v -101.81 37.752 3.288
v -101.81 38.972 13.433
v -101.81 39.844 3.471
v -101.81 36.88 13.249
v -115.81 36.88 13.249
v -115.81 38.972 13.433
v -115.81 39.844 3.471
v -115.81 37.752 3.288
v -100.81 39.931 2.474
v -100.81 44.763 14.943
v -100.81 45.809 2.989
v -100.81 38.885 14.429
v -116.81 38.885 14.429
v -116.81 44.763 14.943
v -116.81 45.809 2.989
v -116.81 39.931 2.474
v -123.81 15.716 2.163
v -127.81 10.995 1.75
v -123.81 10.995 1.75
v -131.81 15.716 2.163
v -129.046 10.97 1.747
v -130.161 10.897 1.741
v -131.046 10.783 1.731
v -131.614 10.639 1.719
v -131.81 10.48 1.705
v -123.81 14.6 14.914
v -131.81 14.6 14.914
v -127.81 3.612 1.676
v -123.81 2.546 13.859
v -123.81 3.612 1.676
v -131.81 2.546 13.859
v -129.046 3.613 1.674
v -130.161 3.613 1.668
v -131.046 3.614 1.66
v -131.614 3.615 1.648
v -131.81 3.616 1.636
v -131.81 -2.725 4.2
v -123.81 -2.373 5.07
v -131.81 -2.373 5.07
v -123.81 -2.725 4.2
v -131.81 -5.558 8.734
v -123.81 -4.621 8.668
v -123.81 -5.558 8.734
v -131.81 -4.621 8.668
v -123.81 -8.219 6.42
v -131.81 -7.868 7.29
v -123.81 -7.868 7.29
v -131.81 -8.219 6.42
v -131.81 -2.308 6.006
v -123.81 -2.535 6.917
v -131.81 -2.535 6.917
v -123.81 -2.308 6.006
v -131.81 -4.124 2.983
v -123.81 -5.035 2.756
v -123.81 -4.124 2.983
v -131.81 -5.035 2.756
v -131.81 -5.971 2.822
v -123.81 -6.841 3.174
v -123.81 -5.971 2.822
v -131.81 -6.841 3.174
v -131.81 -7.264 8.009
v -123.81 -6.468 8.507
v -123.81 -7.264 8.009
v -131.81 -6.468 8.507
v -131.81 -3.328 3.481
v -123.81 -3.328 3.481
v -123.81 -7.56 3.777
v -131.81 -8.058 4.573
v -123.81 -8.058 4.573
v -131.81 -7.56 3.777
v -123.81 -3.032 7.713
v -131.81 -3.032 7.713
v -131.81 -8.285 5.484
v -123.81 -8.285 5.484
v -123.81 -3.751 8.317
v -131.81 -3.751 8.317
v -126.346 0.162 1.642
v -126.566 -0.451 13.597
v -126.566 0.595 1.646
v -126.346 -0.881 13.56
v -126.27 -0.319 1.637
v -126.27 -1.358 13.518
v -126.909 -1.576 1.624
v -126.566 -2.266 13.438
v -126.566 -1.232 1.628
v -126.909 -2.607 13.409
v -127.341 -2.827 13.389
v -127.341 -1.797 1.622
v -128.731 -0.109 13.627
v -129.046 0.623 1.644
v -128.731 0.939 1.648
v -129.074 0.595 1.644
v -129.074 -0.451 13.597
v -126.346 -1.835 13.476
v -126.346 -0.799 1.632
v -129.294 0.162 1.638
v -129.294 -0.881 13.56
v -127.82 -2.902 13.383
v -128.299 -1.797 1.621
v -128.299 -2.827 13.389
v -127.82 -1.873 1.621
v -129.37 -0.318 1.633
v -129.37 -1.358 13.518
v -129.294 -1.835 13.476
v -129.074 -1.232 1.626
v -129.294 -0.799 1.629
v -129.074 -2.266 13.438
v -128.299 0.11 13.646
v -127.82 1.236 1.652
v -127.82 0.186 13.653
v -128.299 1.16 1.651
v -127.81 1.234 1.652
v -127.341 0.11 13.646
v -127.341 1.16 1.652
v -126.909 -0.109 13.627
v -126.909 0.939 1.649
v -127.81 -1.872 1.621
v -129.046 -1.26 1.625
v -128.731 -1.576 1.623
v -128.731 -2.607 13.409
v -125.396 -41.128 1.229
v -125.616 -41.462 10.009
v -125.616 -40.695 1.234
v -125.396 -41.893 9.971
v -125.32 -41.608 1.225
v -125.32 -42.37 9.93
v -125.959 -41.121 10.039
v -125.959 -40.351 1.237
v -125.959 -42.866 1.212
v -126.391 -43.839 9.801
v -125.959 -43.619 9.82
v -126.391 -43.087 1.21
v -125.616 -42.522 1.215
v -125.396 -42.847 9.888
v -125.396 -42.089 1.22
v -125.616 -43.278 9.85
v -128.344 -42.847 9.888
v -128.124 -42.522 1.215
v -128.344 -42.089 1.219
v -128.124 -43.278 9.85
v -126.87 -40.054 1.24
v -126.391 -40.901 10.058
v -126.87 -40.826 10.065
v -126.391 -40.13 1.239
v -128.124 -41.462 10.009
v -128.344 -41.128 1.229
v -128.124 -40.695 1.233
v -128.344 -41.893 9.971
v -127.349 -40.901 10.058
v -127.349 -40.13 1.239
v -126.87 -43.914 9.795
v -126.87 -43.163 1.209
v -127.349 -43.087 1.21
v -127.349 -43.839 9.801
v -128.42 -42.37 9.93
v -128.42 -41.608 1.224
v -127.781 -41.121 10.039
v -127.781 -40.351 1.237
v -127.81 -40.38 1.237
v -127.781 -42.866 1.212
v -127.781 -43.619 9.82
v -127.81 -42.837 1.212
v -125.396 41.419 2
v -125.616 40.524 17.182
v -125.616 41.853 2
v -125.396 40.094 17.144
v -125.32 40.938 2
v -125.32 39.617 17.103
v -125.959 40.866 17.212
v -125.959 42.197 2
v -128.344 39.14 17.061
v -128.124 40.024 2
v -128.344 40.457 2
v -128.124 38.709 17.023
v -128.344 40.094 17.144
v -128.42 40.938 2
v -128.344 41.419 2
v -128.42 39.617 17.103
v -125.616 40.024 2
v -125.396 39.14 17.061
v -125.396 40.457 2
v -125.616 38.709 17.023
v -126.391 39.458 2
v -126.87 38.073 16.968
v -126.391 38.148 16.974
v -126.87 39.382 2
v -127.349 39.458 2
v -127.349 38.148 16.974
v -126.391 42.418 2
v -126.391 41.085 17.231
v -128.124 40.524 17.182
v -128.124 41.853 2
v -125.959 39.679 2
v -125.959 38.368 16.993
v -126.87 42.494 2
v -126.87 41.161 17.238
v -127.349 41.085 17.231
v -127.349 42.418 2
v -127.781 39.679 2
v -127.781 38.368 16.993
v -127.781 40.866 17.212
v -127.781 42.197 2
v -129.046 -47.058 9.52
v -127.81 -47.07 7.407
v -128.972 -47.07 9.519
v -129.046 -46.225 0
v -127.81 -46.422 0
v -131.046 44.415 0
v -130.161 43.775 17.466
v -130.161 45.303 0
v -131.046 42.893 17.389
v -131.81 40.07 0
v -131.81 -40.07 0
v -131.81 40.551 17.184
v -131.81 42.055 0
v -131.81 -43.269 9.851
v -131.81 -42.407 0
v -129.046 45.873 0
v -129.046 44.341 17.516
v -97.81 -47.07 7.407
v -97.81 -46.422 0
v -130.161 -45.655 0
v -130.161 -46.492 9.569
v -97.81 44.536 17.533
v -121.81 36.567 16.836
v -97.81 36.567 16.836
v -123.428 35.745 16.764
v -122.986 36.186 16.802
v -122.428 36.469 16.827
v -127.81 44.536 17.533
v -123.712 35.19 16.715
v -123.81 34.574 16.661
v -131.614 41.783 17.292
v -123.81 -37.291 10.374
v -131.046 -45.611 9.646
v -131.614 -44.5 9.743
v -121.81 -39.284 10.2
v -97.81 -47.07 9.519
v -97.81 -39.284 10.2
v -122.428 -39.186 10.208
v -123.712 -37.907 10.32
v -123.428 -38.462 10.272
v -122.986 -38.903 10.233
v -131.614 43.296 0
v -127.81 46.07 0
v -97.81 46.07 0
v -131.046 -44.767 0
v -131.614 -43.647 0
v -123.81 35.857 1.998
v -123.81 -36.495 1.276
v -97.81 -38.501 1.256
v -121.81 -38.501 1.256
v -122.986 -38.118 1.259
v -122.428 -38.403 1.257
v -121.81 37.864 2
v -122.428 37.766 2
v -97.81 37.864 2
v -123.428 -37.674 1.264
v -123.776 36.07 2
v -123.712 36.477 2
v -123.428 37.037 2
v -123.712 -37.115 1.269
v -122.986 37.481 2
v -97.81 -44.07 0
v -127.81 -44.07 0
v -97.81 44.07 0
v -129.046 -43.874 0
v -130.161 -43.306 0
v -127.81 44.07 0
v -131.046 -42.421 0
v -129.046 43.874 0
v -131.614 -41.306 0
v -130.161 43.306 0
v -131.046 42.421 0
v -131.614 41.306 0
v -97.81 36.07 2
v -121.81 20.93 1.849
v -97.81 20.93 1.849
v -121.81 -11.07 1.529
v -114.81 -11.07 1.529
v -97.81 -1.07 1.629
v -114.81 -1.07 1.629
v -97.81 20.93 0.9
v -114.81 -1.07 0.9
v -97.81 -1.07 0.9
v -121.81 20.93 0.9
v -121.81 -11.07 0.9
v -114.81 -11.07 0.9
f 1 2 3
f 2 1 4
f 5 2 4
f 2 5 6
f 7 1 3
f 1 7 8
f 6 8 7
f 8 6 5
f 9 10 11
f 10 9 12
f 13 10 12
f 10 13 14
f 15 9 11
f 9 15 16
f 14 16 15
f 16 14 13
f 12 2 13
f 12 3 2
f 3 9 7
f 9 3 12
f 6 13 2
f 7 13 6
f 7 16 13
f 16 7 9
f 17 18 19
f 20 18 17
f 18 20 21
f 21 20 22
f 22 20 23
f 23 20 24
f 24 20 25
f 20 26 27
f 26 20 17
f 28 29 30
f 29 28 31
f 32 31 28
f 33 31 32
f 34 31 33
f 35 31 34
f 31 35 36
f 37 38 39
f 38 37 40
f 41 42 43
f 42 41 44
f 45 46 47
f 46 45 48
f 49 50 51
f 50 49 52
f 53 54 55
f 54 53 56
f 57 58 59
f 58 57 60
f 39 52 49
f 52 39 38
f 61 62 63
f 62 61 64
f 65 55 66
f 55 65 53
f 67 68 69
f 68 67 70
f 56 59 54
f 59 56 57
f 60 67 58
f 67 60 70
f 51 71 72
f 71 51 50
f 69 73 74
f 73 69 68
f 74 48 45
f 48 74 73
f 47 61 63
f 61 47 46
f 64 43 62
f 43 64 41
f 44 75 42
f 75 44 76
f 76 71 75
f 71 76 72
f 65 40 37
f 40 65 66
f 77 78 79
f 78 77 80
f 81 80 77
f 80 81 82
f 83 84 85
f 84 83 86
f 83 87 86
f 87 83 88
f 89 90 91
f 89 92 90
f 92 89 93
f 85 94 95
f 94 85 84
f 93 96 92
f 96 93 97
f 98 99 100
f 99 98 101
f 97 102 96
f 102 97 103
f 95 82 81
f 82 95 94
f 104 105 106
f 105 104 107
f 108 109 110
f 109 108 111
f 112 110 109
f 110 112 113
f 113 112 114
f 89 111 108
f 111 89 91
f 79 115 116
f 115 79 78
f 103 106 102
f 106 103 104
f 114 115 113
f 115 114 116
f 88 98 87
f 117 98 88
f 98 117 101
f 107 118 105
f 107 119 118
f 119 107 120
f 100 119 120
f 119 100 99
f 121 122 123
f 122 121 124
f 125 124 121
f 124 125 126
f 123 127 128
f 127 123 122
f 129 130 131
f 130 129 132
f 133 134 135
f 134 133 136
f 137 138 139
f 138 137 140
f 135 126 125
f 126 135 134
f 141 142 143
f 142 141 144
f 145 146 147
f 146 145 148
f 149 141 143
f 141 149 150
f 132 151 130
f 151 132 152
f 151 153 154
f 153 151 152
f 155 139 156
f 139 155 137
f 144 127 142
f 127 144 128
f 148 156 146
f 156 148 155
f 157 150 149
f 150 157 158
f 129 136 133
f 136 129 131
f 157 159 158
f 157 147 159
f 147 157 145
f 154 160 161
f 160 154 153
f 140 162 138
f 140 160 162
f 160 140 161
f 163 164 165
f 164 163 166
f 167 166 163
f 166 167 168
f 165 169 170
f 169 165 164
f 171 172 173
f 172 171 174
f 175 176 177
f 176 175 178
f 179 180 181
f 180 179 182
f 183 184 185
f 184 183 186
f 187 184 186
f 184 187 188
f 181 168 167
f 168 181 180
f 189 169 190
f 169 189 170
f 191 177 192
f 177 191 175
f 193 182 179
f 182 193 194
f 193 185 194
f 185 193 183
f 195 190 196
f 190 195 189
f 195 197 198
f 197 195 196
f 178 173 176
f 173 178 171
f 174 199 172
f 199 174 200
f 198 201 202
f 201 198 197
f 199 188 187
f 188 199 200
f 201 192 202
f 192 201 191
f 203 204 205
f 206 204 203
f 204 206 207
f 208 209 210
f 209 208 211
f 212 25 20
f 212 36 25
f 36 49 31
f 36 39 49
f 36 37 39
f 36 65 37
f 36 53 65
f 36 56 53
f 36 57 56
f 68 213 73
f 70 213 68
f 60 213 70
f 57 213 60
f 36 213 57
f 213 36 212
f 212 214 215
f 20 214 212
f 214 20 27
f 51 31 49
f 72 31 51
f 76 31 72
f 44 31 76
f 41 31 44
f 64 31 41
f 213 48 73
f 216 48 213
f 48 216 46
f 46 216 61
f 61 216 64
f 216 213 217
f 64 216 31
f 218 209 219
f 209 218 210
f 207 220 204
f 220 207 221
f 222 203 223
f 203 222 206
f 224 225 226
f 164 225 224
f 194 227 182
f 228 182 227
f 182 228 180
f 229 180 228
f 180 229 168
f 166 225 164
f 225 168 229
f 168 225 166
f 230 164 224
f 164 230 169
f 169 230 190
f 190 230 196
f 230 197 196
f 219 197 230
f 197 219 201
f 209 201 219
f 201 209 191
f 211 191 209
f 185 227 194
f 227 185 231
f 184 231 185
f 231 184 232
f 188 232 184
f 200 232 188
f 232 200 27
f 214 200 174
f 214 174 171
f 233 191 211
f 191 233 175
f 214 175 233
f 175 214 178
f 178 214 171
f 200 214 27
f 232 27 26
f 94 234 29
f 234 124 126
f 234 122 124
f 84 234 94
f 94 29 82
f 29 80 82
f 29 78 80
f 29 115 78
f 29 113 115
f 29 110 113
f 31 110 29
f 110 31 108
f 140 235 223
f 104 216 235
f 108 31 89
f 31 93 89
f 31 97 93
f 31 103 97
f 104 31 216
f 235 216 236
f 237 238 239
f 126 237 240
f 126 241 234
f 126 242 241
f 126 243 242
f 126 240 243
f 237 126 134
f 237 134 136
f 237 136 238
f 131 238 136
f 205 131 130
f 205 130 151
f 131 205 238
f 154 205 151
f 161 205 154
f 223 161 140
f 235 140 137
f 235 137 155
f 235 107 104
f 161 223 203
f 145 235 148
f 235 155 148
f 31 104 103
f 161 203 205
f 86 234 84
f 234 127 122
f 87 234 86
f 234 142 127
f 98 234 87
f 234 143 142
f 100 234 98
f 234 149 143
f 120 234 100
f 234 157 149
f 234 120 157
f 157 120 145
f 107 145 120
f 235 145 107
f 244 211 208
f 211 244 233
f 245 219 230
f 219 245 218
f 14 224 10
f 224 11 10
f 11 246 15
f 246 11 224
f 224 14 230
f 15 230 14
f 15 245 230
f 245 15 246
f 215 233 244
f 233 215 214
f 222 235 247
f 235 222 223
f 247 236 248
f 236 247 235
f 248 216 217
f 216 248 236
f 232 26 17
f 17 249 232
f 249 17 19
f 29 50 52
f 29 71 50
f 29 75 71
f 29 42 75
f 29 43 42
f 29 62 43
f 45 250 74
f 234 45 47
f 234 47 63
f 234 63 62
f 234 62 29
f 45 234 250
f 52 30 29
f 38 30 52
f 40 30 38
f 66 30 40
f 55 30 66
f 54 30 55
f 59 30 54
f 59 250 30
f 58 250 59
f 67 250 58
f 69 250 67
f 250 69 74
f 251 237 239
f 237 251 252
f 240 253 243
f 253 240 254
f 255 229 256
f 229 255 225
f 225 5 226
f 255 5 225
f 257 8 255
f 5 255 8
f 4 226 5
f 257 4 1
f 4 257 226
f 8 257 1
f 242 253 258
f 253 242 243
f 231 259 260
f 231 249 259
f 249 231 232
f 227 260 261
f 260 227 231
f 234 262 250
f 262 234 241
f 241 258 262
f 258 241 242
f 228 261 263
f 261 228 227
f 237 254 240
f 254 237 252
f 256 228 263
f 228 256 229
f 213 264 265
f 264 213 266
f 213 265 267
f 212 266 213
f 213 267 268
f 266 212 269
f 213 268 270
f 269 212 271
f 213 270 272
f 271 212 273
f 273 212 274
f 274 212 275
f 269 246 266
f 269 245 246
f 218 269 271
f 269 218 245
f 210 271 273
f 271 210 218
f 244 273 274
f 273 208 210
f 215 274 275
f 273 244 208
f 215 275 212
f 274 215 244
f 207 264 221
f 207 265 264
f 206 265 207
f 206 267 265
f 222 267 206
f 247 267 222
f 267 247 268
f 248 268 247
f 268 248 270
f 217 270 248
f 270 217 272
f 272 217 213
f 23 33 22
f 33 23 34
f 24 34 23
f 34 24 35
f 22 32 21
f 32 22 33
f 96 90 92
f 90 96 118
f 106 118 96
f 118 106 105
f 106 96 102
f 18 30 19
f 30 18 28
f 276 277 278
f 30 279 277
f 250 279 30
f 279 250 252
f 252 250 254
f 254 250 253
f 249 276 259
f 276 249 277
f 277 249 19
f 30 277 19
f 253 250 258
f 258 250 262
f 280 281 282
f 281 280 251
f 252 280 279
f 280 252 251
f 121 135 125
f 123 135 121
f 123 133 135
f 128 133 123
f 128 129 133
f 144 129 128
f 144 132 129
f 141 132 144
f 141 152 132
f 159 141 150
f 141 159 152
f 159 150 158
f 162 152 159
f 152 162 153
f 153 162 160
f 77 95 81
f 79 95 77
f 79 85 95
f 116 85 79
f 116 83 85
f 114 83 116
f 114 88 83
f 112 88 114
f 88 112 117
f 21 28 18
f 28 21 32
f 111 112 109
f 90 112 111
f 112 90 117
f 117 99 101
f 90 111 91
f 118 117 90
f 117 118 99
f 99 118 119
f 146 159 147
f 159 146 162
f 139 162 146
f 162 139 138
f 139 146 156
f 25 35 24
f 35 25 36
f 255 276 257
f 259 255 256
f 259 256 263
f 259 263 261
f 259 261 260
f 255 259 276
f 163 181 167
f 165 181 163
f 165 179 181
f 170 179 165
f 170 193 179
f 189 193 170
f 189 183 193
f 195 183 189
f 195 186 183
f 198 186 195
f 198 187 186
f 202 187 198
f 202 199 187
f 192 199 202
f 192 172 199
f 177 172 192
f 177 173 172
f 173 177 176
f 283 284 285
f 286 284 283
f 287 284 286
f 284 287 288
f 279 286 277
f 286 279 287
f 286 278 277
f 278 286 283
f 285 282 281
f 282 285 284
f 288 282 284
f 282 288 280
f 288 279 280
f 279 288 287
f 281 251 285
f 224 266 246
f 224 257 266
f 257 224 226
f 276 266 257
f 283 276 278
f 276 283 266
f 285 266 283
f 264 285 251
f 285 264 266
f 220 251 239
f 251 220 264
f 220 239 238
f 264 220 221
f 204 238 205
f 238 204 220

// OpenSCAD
// import("./orig/laplace-mid.stl");

xDim    = 263.62;
yDim    = 92.14;
zDimMax = 17.6;
cRad    = 4;

angle   = 5;
botThickBack  = 2;
botThickFront = 1.2;

xIntDim = xDim-16;
yIntDim = yDim-16;
zIntOff = 1.2;
cIntRad = 2;

insertDim = 3.1; // brass insert holes

$fn=20;

intersection() {
   angled(); // complete form 
   translate([-xDim/2-1, -yDim/2-1,-1]) cube([35,yDim+2,zDimMax+1]);
}

/* angled() -- complete form */
module angled() {
   /* body */
   difference() {
      translate([0,yDim/2,0]) rotate([angle,0,0]) translate([0,-yDim/2,0]) midExt();
      translate([-xDim/2-1,-yDim/2-1,-30]) cube([xDim+2,yDim+2,30]);
   }
   /* bottom */
   bot();
}

module testCutout() {
   hull() {
      translate([-xDim/2+cRad+50,-yDim/2+cRad+20,-0.1]) cylinder(r=cRad,h=botThickBack+0.2);
      translate([-xDim/2+cRad+50,yDim/2-cRad-20,-0.1]) cylinder(r=cRad,h=botThickBack+0.2);
      translate([xDim/2-cRad-20,-yDim/2+cRad+20,-0.1]) cylinder(r=cRad,h=botThickBack+0.2);
      translate([xDim/2-cRad-20,yDim/2-cRad-20,-0.1]) cylinder(r=cRad,h=botThickBack+0.2);
   }
}

module bot() {
   difference() {
      hull() {
         translate([-xDim/2+cRad,-yDim/2+cRad+2,0]) cylinder(r=cRad,h=botThickFront);
         translate([-xDim/2+cRad,yDim/2-cRad-2,0]) cylinder(r=cRad,h=botThickBack);
         translate([xDim/2-cRad,-yDim/2+cRad+2,0]) cylinder(r=cRad,h=botThickFront);
         translate([xDim/2-cRad,yDim/2-cRad-2,0]) cylinder(r=cRad,h=botThickBack);
      }

      /* clean out a little extra space for controller, reset, and power switch */
      translate([10-xDim/2,45-yDim/2,0.9]) cube([43,22,5]);
      translate([10-xDim/2,35-yDim/2,0.9]) cube([7,10.1,5]);
      switch();
   }
}



module midExt() {
   difference() {
      form();
      interior();
      cutouts();
      screwHoles();
   }
}


module form() {
   hull() {
      translate([-xDim/2+cRad,-yDim/2+cRad,0]) cylinder(r=cRad,h=zDimMax);
      translate([-xDim/2+cRad,yDim/2-cRad,0]) cylinder(r=cRad,h=zDimMax);
      translate([xDim/2-cRad,-yDim/2+cRad,0]) cylinder(r=cRad,h=zDimMax);
      translate([xDim/2-cRad,yDim/2-cRad,0]) cylinder(r=cRad,h=zDimMax);
   }
}

module interior() {
   hull() {
      translate([-xIntDim/2+cIntRad,yIntDim/2-cIntRad,zIntOff]) cylinder(r=cIntRad,h=zDimMax);
      translate([xIntDim/2-cIntRad,-yIntDim/2+cIntRad,zIntOff]) cylinder(r=cIntRad,h=zDimMax);
      translate([-xIntDim/2+cIntRad,-yIntDim/2+cIntRad,zIntOff]) cylinder(r=cIntRad,h=zDimMax);
      translate([xIntDim/2-cIntRad,yIntDim/2-cIntRad,zIntOff]) cylinder(r=cIntRad,h=zDimMax);
   }
}

module cutouts() {
   // translate([-xDim/2-0.01,3.92,zIntOff]) translate([0,0,zDimMax-12]) cube([10,12.1,12]); // USB
   translate([-xDim/2-0.01,3.92,zIntOff]) translate([0,0,zDimMax-14]) cube([10,12.1,14]); // USB
  // translate([-xDim/2-0.01,-8.6,zIntOff]) translate([0,0,zDimMax-11]) cube([10,7,11]); // reset
   translate([-xDim/2-0.01,-8.6+4,zIntOff+9]) rotate([0,90,0]) cylinder(r=3,h=10); // reset, v2
   switch();
}

module switch() {
   translate([-xDim/2+15,yDim/2-19.9,3]) {
      translate([1,0,1]) cube([14,15.1,10.0]);
      translate([0,14,0]) cube([16,8,12]);
   }
}

module screwHoles() {
   translate([126.87,-41.168,0]) cylinder(d=insertDim,h=25);
   translate([127.82,0.000497,0]) cylinder(d=insertDim,h=25);
   translate([-127.82,0.000497,0]) cylinder(d=insertDim,h=25);
   translate([126.87,41.132,0]) cylinder(d=insertDim,h=25);
   translate([42.278,42.155,0]) cylinder(d=insertDim,h=25);
   translate([42.278,-42.121,0]) cylinder(d=insertDim,h=25);
   translate([-42.314,42.155,0]) cylinder(d=insertDim,h=25);
   translate([-42.314,-42.121,0]) cylinder(d=insertDim,h=25);
   translate([-126.87,-41.168,0]) cylinder(d=insertDim,h=25);
   translate([-126.87,41.132,0]) cylinder(d=insertDim,h=25);
}

module altBot() {
linear_extrude(height=botThick) projection(cut=true) translate([0,yDim/2,-botThick]) rotate([angle,0,0]) translate([0,-yDim/2,0]) form();
}
